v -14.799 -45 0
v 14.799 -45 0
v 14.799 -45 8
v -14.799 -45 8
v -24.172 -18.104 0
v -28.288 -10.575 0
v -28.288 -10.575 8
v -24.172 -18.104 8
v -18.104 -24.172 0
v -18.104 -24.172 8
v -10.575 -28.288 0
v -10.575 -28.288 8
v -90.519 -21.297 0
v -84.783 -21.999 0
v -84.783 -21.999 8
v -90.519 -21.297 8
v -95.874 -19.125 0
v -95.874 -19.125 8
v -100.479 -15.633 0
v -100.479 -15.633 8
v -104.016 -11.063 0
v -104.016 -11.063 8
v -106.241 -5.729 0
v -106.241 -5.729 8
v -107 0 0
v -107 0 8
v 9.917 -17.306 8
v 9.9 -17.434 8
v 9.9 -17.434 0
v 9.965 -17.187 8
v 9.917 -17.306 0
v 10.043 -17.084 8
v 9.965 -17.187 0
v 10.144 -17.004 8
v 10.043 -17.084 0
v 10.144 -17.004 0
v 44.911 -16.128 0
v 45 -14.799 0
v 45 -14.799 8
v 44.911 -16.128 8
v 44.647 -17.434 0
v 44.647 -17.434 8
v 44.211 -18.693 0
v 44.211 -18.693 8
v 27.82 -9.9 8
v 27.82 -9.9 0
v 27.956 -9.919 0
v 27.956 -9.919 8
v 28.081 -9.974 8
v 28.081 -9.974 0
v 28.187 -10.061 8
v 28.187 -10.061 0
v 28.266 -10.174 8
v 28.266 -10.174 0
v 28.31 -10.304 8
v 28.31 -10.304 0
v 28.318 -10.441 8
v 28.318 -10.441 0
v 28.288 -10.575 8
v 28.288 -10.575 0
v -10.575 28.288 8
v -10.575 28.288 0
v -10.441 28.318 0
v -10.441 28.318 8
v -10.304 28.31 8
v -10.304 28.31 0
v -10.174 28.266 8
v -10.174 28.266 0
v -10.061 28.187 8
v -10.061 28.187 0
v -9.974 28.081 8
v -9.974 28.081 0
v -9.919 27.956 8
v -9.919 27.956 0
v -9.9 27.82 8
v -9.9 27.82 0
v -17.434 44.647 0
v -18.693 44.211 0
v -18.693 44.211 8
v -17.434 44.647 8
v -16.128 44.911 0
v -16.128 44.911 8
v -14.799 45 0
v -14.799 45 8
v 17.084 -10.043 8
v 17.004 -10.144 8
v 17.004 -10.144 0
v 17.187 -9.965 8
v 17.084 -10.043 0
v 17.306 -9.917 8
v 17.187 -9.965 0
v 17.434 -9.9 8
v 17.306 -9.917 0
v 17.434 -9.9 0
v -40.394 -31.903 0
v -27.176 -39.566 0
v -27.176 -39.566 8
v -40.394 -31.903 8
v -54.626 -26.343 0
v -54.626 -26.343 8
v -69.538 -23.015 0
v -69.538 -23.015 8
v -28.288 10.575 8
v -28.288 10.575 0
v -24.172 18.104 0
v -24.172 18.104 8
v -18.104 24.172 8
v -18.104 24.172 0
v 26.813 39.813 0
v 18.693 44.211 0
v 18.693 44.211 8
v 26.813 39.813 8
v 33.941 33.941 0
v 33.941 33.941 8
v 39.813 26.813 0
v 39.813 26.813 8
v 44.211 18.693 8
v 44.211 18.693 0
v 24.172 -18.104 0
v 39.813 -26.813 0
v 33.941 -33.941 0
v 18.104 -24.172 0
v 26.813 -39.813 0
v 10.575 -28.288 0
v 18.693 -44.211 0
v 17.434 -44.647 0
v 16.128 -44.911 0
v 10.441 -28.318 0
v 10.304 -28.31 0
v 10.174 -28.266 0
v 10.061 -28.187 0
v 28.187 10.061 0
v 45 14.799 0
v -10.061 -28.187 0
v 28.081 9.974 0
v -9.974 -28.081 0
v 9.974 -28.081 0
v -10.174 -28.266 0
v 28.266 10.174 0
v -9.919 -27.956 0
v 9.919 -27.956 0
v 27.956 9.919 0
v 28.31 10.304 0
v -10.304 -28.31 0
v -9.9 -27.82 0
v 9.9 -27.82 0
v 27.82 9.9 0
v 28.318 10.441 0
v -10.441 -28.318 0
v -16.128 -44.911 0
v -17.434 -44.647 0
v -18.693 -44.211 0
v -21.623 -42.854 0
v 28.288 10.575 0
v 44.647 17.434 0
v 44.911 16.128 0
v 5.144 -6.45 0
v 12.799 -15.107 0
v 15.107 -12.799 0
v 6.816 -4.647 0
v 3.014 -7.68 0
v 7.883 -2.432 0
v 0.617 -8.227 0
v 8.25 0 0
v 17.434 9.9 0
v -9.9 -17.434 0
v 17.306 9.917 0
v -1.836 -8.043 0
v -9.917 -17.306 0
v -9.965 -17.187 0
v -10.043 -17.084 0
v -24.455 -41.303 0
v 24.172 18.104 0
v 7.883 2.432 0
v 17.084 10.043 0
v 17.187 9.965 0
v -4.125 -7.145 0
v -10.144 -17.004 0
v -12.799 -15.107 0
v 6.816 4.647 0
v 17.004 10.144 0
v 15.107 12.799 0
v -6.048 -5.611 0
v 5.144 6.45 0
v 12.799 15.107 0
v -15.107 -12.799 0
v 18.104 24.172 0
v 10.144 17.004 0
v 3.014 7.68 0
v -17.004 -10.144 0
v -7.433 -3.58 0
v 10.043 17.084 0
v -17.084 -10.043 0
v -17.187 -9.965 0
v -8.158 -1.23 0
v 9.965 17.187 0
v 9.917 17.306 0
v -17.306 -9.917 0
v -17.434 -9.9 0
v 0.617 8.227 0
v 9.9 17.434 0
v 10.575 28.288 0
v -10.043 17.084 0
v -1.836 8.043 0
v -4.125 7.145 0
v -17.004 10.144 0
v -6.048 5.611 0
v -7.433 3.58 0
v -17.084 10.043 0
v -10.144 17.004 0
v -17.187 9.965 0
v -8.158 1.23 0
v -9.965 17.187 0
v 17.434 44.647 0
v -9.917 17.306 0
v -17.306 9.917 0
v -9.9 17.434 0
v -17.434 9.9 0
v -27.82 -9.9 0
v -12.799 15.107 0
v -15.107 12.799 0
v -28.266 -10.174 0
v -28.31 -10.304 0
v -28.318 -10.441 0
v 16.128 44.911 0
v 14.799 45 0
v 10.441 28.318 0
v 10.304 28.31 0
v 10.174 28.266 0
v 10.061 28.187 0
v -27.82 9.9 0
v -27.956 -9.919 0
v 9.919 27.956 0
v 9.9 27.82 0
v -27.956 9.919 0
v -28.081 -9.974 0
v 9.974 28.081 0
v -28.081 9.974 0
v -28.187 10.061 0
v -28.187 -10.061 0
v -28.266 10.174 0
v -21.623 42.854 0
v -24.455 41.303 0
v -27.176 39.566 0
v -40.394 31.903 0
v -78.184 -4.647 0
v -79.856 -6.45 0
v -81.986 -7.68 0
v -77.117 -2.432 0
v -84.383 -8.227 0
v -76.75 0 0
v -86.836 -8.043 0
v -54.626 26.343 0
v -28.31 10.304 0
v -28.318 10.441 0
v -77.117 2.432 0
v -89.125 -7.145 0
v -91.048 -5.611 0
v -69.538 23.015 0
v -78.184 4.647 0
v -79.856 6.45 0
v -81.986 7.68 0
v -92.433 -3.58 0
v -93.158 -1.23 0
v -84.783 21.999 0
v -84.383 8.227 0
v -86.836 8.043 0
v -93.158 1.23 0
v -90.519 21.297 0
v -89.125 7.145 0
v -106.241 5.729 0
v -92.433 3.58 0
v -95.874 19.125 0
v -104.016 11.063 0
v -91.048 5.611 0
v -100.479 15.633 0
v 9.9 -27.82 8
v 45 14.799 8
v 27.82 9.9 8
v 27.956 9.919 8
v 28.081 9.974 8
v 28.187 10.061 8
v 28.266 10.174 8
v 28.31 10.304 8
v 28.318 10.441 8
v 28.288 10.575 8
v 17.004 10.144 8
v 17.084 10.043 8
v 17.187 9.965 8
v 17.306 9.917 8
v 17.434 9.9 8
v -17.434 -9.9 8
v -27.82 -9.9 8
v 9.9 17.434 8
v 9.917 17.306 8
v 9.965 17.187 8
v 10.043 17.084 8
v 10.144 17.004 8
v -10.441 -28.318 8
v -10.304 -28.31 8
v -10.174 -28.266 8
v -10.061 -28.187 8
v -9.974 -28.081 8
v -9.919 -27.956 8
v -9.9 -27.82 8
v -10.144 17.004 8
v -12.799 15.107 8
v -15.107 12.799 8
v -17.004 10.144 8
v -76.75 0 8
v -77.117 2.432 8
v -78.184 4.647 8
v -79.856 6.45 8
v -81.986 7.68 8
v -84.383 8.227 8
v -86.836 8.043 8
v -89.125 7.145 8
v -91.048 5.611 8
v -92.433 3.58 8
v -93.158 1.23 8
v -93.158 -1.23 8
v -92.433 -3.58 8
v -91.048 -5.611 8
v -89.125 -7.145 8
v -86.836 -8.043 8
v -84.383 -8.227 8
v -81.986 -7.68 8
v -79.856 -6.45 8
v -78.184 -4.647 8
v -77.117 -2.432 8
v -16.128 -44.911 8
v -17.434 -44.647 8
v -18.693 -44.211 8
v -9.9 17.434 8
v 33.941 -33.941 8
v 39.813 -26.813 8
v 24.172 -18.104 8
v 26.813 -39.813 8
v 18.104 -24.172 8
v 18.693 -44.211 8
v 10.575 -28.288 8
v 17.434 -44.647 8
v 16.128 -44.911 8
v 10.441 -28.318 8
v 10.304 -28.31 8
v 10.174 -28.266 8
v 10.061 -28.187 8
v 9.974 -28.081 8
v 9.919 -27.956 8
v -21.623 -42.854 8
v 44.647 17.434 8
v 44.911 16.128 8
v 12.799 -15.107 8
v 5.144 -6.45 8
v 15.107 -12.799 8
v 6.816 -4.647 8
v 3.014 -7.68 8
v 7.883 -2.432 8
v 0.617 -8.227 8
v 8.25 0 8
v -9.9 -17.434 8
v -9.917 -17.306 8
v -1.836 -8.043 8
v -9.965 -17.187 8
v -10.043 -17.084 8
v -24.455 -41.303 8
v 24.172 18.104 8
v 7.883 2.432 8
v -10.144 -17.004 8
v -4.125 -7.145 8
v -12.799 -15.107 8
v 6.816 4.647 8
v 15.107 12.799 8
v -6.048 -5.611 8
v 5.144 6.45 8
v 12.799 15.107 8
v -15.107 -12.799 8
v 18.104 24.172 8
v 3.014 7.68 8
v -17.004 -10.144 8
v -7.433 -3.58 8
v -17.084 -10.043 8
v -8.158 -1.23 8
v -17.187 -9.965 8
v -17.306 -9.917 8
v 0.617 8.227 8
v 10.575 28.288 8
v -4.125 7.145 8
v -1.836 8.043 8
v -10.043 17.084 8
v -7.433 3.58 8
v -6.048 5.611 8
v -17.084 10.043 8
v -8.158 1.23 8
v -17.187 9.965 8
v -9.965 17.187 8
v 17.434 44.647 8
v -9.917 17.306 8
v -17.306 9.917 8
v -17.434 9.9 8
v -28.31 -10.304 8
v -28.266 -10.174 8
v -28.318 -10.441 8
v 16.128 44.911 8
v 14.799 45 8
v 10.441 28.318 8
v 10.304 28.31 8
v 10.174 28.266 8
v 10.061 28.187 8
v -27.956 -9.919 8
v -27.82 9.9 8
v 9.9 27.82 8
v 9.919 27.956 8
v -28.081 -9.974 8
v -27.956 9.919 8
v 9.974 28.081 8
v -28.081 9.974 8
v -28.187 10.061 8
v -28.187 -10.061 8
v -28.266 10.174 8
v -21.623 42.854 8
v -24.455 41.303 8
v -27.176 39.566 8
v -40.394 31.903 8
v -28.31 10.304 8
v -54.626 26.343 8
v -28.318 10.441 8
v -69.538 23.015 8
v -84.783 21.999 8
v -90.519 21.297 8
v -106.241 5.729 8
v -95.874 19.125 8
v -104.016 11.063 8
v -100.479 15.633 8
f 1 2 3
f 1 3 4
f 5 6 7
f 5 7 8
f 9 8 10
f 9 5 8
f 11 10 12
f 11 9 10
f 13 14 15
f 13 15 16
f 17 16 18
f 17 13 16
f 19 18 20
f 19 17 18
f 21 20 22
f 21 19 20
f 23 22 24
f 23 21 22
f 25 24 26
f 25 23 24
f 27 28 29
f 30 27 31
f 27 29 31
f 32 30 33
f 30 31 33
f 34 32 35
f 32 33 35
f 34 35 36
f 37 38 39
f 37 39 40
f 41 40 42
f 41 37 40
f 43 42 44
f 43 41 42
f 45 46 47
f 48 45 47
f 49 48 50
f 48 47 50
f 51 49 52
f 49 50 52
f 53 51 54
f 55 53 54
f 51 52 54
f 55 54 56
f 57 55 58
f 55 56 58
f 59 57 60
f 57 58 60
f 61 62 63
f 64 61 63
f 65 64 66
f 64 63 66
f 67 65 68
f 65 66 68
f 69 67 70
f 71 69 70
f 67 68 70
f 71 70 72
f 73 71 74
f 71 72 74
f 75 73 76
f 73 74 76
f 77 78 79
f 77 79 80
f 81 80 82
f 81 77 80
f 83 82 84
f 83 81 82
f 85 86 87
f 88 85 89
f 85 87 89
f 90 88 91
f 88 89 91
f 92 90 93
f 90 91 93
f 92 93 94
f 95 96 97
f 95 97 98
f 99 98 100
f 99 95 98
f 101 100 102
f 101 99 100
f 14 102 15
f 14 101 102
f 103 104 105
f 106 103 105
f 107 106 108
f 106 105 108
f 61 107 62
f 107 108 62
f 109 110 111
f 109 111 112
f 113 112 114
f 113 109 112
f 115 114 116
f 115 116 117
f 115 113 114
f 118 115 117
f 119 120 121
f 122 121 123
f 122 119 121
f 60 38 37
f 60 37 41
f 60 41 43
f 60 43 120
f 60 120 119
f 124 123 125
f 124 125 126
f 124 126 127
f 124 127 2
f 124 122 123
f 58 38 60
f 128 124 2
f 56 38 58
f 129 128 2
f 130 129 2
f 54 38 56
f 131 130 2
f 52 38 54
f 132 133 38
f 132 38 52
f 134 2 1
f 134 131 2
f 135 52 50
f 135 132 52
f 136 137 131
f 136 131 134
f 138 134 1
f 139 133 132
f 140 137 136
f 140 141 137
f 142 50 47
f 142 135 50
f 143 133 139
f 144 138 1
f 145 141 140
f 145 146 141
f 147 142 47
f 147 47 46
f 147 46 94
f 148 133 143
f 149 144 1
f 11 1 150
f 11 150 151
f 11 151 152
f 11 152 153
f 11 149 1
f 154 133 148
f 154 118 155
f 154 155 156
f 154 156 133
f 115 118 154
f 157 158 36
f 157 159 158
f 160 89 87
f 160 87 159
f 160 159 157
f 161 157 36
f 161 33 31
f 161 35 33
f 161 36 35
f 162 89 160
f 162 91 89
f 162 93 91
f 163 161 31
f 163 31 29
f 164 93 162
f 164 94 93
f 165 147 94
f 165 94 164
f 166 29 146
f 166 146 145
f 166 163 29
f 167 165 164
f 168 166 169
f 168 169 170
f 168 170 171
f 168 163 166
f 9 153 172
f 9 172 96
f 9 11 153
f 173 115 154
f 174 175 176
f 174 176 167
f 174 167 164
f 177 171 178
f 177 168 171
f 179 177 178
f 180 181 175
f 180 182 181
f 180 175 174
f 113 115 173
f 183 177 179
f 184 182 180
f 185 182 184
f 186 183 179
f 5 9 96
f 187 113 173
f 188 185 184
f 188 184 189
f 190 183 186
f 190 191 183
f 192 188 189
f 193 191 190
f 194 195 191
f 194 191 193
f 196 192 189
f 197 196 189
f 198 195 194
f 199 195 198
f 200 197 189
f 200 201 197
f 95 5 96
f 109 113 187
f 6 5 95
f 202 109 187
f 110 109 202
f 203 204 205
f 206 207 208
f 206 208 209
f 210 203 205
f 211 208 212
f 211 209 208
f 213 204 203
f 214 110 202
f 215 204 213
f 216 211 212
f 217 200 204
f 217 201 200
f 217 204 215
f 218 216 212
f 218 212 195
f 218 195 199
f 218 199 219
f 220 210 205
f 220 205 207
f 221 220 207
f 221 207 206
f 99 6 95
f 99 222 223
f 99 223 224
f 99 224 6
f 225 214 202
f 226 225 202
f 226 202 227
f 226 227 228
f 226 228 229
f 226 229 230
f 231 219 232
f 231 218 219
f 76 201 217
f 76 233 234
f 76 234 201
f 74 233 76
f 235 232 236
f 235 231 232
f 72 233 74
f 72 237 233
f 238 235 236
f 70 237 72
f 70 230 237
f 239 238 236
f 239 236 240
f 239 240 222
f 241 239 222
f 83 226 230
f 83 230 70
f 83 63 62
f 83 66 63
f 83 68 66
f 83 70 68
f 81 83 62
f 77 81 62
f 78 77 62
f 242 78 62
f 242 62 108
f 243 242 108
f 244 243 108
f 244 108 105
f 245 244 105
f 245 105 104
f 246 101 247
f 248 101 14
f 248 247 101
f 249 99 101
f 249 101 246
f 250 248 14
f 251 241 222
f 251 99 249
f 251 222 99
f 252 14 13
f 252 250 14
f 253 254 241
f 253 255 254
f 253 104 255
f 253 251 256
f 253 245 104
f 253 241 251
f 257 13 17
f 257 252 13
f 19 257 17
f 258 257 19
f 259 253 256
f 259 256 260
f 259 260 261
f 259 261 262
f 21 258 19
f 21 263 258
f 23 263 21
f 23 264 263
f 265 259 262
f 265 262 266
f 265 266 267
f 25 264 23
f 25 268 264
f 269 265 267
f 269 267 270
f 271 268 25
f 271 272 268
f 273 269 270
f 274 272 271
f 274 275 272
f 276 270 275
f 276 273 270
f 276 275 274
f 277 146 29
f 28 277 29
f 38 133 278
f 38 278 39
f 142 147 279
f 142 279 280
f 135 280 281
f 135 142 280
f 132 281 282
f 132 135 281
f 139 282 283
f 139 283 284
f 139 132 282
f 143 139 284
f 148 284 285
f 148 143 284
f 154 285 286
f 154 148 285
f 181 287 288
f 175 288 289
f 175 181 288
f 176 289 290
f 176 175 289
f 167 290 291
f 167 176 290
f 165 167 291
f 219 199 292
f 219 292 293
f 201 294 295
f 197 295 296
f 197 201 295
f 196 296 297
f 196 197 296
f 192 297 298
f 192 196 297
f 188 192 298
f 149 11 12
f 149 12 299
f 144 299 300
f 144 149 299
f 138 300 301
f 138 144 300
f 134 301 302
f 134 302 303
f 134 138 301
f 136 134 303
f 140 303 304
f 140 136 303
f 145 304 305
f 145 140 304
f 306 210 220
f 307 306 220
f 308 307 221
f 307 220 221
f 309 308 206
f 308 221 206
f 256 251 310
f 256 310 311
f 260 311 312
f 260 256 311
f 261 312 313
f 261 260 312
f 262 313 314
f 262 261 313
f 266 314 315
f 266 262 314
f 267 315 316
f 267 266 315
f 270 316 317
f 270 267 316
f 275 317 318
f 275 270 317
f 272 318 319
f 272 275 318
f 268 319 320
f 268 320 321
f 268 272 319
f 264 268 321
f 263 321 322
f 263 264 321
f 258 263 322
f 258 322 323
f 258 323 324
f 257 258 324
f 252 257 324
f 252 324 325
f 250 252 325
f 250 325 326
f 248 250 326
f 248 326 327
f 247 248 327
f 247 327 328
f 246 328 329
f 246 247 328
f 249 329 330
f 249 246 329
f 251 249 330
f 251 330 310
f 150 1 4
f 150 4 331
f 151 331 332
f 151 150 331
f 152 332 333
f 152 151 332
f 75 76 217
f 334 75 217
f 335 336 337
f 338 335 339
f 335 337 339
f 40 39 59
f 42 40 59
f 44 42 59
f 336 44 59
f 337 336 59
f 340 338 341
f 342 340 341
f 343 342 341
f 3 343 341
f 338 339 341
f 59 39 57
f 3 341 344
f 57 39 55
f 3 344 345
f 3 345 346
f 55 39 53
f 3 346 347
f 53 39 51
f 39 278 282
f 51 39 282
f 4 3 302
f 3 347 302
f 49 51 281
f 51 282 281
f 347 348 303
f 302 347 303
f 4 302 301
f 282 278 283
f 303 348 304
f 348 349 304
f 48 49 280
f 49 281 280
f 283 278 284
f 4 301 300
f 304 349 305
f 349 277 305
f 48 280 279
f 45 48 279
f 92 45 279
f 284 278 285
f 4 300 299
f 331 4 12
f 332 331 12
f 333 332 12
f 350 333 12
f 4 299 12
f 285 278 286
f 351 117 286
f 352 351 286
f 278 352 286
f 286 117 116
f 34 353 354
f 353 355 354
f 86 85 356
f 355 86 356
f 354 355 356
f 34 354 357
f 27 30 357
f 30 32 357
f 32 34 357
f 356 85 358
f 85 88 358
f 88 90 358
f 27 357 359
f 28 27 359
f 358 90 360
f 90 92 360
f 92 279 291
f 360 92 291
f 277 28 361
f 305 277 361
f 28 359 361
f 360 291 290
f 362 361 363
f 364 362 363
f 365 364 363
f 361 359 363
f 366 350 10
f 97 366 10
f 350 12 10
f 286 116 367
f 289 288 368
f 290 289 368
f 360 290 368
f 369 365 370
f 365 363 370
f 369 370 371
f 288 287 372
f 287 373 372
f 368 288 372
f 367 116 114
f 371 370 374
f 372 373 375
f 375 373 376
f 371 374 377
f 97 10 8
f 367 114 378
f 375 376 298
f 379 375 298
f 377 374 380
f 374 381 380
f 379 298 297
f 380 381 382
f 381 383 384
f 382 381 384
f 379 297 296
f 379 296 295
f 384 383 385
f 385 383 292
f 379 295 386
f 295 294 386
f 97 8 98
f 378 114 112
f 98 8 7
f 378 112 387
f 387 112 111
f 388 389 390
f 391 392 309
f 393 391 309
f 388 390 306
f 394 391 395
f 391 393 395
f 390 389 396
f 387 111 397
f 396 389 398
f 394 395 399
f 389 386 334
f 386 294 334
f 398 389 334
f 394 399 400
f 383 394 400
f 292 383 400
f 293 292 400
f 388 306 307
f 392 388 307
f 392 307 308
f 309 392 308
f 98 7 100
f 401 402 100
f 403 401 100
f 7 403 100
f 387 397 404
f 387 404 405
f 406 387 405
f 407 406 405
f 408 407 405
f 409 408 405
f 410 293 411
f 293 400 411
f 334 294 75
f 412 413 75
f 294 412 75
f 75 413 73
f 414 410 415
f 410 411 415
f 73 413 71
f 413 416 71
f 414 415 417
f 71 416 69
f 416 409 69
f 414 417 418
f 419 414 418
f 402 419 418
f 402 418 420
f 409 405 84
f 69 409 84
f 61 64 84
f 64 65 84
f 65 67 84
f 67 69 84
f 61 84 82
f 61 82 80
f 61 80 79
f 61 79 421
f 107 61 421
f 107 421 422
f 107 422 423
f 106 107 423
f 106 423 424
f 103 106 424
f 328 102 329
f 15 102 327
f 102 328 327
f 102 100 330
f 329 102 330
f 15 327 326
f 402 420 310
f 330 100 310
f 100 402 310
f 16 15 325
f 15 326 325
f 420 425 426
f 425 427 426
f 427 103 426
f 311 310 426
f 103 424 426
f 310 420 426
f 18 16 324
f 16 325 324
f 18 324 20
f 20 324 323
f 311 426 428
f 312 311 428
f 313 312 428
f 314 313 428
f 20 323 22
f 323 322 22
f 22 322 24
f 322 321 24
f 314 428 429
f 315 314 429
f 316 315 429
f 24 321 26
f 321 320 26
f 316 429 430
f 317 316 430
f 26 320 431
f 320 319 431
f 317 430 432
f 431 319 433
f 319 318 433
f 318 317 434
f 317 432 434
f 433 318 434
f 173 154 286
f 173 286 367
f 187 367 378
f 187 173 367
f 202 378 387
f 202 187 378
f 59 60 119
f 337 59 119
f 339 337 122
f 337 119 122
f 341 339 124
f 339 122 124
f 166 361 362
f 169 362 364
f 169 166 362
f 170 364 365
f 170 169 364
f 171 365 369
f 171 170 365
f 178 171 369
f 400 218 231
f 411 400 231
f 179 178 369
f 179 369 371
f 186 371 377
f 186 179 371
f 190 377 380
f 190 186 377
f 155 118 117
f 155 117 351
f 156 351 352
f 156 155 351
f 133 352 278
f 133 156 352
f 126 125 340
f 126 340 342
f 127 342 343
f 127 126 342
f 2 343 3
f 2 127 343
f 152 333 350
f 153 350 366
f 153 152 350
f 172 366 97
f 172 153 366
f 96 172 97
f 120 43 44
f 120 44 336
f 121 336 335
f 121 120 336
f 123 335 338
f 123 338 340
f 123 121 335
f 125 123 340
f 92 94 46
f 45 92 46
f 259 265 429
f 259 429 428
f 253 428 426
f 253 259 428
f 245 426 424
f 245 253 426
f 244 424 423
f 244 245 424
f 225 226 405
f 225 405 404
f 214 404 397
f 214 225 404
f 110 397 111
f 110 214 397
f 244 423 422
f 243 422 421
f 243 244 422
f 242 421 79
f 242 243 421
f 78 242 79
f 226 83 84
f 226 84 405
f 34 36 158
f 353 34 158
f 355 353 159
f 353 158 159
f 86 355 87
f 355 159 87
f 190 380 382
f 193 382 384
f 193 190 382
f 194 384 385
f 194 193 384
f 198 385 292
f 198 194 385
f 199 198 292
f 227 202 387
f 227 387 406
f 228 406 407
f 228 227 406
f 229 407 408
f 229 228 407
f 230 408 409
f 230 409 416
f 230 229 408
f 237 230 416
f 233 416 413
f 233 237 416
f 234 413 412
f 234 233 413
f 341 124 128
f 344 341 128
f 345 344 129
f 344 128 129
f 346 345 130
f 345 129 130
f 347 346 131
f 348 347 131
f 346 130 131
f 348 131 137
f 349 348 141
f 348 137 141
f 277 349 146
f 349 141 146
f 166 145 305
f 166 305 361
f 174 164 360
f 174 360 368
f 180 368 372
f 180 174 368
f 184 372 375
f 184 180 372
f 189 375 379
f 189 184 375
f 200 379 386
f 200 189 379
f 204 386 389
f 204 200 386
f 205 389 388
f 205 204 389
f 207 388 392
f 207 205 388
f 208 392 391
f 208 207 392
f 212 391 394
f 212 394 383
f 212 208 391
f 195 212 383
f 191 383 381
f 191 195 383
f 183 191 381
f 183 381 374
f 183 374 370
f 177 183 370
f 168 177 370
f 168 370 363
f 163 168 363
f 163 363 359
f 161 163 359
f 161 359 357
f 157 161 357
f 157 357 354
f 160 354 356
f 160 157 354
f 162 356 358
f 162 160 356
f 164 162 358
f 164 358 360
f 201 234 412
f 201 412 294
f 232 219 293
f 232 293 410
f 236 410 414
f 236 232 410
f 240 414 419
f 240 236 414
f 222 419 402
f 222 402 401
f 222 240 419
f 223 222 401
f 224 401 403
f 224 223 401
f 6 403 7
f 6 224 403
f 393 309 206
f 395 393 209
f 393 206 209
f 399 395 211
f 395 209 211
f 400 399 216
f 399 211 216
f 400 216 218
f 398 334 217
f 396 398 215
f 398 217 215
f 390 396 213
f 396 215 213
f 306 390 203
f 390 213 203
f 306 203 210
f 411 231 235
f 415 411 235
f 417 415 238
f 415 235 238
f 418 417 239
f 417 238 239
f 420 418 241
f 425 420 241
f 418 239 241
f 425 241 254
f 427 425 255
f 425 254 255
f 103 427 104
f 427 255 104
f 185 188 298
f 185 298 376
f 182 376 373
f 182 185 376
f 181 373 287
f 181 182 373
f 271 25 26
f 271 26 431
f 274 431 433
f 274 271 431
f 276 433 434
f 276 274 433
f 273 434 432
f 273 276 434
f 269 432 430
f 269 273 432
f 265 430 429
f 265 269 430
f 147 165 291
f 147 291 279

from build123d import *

# Parameters (mm, degrees)
SKETCH1_R          = 8.25
BASE_EXTRUDE_DEPTH = 8


with BuildPart() as part:
    # Sketch1 → Base-Extrude (new body)
    with BuildSketch(Plane.XY):
        with BuildLine():
            Line((45, 14.798648587), (45, -14.798648587))
            ThreePointArc((45, -14.798648587), (44.800644447, -16.785447123), (44.210526316, -18.693029794))
            ThreePointArc((44.210526316, -18.693029794), (33.941125497, -33.941125497), (18.693029794, -44.210526316))
            ThreePointArc((18.693029794, -44.210526316), (16.785447123, -44.800644447), (14.798648587, -45))
            Line((14.798648587, -45), (-14.798648587, -45))
            ThreePointArc((-14.798648587, -45), (-16.785447123, -44.800644447), (-18.693029794, -44.210526316))
            ThreePointArc((-18.693029794, -44.210526316), (-23.05203941, -42.102297788), (-27.176470588, -39.565634664))
            ThreePointArc((-27.176470588, -39.565634664), (-54.625644624, -26.342588675), (-84.782545805, -21.998925285))
            ThreePointArc((-84.782545805, -21.998925285), (-100.479276593, -15.633041807), (-107, 0))
            ThreePointArc((-107, 0), (-100.479276593, 15.633041807), (-84.782545805, 21.998925285))
            ThreePointArc((-84.782545805, 21.998925285), (-54.625644624, 26.342588675), (-27.176470588, 39.565634664))
            ThreePointArc((-27.176470588, 39.565634664), (-23.05203941, 42.102297788), (-18.693029794, 44.210526316))
            ThreePointArc((-18.693029794, 44.210526316), (-16.785447123, 44.800644447), (-14.798648587, 45))
            Line((-14.798648587, 45), (14.798648587, 45))
            ThreePointArc((14.798648587, 45), (16.785447123, 44.800644447), (18.693029794, 44.210526316))
            ThreePointArc((18.693029794, 44.210526316), (33.941125497, 33.941125497), (44.210526316, 18.693029794))
            ThreePointArc((44.210526316, 18.693029794), (44.800644447, 16.785447123), (45, 14.798648587))
        make_face()
        with Locations((-85, 0)):
            Circle(SKETCH1_R, mode=Mode.SUBTRACT)
        Circle(SKETCH1_R, mode=Mode.SUBTRACT)
        with BuildLine():
            Line((-9.9, 27.819597409), (-9.9, 17.433588271))
            ThreePointArc((-9.9, 17.433588271), (-9.965213375, 17.186686284), (-10.143842365, 17.004189545))
            ThreePointArc((-10.143842365, 17.004189545), (-14.000714267, 14.000714267), (-17.004189545, 10.143842365))
            ThreePointArc((-17.004189545, 10.143842365), (-17.186686284, 9.965213375), (-17.433588271, 9.9))
            Line((-17.433588271, 9.9), (-27.819597409, 9.9))
            ThreePointArc((-27.819597409, 9.9), (-28.23041494, 10.114993059), (-28.2879408, 10.575084175))
            ThreePointArc((-28.2879408, 10.575084175), (-21.354624792, 21.354624792), (-10.575084175, 28.2879408))
            ThreePointArc((-10.575084175, 28.2879408), (-10.114993059, 28.23041494), (-9.9, 27.819597409))
        make_face(mode=Mode.SUBTRACT)
        with BuildLine():
            Line((17.433588271, 9.9), (27.819597409, 9.9))
            ThreePointArc((27.819597409, 9.9), (28.23041494, 10.114993059), (28.2879408, 10.575084175))
            ThreePointArc((28.2879408, 10.575084175), (21.354624792, 21.354624792), (10.575084175, 28.2879408))
            ThreePointArc((10.575084175, 28.2879408), (10.114993059, 28.23041494), (9.9, 27.819597409))
            Line((9.9, 27.819597409), (9.9, 17.433588271))
            ThreePointArc((9.9, 17.433588271), (9.965213375, 17.186686284), (10.143842365, 17.004189545))
            ThreePointArc((10.143842365, 17.004189545), (14.000714267, 14.000714267), (17.004189545, 10.143842365))
            ThreePointArc((17.004189545, 10.143842365), (17.186686284, 9.965213375), (17.433588271, 9.9))
        make_face(mode=Mode.SUBTRACT)
        with BuildLine():
            Line((9.9, -27.819597409), (9.9, -17.433588271))
            ThreePointArc((9.9, -17.433588271), (9.965213375, -17.186686284), (10.143842365, -17.004189545))
            ThreePointArc((10.143842365, -17.004189545), (14.000714267, -14.000714267), (17.004189545, -10.143842365))
            ThreePointArc((17.004189545, -10.143842365), (17.186686284, -9.965213375), (17.433588271, -9.9))
            Line((17.433588271, -9.9), (27.819597409, -9.9))
            ThreePointArc((27.819597409, -9.9), (28.23041494, -10.114993059), (28.2879408, -10.575084175))
            ThreePointArc((28.2879408, -10.575084175), (21.354624792, -21.354624792), (10.575084175, -28.2879408))
            ThreePointArc((10.575084175, -28.2879408), (10.114993059, -28.23041494), (9.9, -27.819597409))
        make_face(mode=Mode.SUBTRACT)
        with BuildLine():
            Line((-17.433588271, -9.9), (-27.819597409, -9.9))
            ThreePointArc((-27.819597409, -9.9), (-28.23041494, -10.114993059), (-28.2879408, -10.575084175))
            ThreePointArc((-28.2879408, -10.575084175), (-21.354624792, -21.354624792), (-10.575084175, -28.2879408))
            ThreePointArc((-10.575084175, -28.2879408), (-10.114993059, -28.23041494), (-9.9, -27.819597409))
            Line((-9.9, -27.819597409), (-9.9, -17.433588271))
            ThreePointArc((-9.9, -17.433588271), (-9.965213375, -17.186686284), (-10.143842365, -17.004189545))
            ThreePointArc((-10.143842365, -17.004189545), (-14.000714267, -14.000714267), (-17.004189545, -10.143842365))
            ThreePointArc((-17.004189545, -10.143842365), (-17.186686284, -9.965213375), (-17.433588271, -9.9))
        make_face(mode=Mode.SUBTRACT)
    extrude(amount=BASE_EXTRUDE_DEPTH)


solid = part.part
